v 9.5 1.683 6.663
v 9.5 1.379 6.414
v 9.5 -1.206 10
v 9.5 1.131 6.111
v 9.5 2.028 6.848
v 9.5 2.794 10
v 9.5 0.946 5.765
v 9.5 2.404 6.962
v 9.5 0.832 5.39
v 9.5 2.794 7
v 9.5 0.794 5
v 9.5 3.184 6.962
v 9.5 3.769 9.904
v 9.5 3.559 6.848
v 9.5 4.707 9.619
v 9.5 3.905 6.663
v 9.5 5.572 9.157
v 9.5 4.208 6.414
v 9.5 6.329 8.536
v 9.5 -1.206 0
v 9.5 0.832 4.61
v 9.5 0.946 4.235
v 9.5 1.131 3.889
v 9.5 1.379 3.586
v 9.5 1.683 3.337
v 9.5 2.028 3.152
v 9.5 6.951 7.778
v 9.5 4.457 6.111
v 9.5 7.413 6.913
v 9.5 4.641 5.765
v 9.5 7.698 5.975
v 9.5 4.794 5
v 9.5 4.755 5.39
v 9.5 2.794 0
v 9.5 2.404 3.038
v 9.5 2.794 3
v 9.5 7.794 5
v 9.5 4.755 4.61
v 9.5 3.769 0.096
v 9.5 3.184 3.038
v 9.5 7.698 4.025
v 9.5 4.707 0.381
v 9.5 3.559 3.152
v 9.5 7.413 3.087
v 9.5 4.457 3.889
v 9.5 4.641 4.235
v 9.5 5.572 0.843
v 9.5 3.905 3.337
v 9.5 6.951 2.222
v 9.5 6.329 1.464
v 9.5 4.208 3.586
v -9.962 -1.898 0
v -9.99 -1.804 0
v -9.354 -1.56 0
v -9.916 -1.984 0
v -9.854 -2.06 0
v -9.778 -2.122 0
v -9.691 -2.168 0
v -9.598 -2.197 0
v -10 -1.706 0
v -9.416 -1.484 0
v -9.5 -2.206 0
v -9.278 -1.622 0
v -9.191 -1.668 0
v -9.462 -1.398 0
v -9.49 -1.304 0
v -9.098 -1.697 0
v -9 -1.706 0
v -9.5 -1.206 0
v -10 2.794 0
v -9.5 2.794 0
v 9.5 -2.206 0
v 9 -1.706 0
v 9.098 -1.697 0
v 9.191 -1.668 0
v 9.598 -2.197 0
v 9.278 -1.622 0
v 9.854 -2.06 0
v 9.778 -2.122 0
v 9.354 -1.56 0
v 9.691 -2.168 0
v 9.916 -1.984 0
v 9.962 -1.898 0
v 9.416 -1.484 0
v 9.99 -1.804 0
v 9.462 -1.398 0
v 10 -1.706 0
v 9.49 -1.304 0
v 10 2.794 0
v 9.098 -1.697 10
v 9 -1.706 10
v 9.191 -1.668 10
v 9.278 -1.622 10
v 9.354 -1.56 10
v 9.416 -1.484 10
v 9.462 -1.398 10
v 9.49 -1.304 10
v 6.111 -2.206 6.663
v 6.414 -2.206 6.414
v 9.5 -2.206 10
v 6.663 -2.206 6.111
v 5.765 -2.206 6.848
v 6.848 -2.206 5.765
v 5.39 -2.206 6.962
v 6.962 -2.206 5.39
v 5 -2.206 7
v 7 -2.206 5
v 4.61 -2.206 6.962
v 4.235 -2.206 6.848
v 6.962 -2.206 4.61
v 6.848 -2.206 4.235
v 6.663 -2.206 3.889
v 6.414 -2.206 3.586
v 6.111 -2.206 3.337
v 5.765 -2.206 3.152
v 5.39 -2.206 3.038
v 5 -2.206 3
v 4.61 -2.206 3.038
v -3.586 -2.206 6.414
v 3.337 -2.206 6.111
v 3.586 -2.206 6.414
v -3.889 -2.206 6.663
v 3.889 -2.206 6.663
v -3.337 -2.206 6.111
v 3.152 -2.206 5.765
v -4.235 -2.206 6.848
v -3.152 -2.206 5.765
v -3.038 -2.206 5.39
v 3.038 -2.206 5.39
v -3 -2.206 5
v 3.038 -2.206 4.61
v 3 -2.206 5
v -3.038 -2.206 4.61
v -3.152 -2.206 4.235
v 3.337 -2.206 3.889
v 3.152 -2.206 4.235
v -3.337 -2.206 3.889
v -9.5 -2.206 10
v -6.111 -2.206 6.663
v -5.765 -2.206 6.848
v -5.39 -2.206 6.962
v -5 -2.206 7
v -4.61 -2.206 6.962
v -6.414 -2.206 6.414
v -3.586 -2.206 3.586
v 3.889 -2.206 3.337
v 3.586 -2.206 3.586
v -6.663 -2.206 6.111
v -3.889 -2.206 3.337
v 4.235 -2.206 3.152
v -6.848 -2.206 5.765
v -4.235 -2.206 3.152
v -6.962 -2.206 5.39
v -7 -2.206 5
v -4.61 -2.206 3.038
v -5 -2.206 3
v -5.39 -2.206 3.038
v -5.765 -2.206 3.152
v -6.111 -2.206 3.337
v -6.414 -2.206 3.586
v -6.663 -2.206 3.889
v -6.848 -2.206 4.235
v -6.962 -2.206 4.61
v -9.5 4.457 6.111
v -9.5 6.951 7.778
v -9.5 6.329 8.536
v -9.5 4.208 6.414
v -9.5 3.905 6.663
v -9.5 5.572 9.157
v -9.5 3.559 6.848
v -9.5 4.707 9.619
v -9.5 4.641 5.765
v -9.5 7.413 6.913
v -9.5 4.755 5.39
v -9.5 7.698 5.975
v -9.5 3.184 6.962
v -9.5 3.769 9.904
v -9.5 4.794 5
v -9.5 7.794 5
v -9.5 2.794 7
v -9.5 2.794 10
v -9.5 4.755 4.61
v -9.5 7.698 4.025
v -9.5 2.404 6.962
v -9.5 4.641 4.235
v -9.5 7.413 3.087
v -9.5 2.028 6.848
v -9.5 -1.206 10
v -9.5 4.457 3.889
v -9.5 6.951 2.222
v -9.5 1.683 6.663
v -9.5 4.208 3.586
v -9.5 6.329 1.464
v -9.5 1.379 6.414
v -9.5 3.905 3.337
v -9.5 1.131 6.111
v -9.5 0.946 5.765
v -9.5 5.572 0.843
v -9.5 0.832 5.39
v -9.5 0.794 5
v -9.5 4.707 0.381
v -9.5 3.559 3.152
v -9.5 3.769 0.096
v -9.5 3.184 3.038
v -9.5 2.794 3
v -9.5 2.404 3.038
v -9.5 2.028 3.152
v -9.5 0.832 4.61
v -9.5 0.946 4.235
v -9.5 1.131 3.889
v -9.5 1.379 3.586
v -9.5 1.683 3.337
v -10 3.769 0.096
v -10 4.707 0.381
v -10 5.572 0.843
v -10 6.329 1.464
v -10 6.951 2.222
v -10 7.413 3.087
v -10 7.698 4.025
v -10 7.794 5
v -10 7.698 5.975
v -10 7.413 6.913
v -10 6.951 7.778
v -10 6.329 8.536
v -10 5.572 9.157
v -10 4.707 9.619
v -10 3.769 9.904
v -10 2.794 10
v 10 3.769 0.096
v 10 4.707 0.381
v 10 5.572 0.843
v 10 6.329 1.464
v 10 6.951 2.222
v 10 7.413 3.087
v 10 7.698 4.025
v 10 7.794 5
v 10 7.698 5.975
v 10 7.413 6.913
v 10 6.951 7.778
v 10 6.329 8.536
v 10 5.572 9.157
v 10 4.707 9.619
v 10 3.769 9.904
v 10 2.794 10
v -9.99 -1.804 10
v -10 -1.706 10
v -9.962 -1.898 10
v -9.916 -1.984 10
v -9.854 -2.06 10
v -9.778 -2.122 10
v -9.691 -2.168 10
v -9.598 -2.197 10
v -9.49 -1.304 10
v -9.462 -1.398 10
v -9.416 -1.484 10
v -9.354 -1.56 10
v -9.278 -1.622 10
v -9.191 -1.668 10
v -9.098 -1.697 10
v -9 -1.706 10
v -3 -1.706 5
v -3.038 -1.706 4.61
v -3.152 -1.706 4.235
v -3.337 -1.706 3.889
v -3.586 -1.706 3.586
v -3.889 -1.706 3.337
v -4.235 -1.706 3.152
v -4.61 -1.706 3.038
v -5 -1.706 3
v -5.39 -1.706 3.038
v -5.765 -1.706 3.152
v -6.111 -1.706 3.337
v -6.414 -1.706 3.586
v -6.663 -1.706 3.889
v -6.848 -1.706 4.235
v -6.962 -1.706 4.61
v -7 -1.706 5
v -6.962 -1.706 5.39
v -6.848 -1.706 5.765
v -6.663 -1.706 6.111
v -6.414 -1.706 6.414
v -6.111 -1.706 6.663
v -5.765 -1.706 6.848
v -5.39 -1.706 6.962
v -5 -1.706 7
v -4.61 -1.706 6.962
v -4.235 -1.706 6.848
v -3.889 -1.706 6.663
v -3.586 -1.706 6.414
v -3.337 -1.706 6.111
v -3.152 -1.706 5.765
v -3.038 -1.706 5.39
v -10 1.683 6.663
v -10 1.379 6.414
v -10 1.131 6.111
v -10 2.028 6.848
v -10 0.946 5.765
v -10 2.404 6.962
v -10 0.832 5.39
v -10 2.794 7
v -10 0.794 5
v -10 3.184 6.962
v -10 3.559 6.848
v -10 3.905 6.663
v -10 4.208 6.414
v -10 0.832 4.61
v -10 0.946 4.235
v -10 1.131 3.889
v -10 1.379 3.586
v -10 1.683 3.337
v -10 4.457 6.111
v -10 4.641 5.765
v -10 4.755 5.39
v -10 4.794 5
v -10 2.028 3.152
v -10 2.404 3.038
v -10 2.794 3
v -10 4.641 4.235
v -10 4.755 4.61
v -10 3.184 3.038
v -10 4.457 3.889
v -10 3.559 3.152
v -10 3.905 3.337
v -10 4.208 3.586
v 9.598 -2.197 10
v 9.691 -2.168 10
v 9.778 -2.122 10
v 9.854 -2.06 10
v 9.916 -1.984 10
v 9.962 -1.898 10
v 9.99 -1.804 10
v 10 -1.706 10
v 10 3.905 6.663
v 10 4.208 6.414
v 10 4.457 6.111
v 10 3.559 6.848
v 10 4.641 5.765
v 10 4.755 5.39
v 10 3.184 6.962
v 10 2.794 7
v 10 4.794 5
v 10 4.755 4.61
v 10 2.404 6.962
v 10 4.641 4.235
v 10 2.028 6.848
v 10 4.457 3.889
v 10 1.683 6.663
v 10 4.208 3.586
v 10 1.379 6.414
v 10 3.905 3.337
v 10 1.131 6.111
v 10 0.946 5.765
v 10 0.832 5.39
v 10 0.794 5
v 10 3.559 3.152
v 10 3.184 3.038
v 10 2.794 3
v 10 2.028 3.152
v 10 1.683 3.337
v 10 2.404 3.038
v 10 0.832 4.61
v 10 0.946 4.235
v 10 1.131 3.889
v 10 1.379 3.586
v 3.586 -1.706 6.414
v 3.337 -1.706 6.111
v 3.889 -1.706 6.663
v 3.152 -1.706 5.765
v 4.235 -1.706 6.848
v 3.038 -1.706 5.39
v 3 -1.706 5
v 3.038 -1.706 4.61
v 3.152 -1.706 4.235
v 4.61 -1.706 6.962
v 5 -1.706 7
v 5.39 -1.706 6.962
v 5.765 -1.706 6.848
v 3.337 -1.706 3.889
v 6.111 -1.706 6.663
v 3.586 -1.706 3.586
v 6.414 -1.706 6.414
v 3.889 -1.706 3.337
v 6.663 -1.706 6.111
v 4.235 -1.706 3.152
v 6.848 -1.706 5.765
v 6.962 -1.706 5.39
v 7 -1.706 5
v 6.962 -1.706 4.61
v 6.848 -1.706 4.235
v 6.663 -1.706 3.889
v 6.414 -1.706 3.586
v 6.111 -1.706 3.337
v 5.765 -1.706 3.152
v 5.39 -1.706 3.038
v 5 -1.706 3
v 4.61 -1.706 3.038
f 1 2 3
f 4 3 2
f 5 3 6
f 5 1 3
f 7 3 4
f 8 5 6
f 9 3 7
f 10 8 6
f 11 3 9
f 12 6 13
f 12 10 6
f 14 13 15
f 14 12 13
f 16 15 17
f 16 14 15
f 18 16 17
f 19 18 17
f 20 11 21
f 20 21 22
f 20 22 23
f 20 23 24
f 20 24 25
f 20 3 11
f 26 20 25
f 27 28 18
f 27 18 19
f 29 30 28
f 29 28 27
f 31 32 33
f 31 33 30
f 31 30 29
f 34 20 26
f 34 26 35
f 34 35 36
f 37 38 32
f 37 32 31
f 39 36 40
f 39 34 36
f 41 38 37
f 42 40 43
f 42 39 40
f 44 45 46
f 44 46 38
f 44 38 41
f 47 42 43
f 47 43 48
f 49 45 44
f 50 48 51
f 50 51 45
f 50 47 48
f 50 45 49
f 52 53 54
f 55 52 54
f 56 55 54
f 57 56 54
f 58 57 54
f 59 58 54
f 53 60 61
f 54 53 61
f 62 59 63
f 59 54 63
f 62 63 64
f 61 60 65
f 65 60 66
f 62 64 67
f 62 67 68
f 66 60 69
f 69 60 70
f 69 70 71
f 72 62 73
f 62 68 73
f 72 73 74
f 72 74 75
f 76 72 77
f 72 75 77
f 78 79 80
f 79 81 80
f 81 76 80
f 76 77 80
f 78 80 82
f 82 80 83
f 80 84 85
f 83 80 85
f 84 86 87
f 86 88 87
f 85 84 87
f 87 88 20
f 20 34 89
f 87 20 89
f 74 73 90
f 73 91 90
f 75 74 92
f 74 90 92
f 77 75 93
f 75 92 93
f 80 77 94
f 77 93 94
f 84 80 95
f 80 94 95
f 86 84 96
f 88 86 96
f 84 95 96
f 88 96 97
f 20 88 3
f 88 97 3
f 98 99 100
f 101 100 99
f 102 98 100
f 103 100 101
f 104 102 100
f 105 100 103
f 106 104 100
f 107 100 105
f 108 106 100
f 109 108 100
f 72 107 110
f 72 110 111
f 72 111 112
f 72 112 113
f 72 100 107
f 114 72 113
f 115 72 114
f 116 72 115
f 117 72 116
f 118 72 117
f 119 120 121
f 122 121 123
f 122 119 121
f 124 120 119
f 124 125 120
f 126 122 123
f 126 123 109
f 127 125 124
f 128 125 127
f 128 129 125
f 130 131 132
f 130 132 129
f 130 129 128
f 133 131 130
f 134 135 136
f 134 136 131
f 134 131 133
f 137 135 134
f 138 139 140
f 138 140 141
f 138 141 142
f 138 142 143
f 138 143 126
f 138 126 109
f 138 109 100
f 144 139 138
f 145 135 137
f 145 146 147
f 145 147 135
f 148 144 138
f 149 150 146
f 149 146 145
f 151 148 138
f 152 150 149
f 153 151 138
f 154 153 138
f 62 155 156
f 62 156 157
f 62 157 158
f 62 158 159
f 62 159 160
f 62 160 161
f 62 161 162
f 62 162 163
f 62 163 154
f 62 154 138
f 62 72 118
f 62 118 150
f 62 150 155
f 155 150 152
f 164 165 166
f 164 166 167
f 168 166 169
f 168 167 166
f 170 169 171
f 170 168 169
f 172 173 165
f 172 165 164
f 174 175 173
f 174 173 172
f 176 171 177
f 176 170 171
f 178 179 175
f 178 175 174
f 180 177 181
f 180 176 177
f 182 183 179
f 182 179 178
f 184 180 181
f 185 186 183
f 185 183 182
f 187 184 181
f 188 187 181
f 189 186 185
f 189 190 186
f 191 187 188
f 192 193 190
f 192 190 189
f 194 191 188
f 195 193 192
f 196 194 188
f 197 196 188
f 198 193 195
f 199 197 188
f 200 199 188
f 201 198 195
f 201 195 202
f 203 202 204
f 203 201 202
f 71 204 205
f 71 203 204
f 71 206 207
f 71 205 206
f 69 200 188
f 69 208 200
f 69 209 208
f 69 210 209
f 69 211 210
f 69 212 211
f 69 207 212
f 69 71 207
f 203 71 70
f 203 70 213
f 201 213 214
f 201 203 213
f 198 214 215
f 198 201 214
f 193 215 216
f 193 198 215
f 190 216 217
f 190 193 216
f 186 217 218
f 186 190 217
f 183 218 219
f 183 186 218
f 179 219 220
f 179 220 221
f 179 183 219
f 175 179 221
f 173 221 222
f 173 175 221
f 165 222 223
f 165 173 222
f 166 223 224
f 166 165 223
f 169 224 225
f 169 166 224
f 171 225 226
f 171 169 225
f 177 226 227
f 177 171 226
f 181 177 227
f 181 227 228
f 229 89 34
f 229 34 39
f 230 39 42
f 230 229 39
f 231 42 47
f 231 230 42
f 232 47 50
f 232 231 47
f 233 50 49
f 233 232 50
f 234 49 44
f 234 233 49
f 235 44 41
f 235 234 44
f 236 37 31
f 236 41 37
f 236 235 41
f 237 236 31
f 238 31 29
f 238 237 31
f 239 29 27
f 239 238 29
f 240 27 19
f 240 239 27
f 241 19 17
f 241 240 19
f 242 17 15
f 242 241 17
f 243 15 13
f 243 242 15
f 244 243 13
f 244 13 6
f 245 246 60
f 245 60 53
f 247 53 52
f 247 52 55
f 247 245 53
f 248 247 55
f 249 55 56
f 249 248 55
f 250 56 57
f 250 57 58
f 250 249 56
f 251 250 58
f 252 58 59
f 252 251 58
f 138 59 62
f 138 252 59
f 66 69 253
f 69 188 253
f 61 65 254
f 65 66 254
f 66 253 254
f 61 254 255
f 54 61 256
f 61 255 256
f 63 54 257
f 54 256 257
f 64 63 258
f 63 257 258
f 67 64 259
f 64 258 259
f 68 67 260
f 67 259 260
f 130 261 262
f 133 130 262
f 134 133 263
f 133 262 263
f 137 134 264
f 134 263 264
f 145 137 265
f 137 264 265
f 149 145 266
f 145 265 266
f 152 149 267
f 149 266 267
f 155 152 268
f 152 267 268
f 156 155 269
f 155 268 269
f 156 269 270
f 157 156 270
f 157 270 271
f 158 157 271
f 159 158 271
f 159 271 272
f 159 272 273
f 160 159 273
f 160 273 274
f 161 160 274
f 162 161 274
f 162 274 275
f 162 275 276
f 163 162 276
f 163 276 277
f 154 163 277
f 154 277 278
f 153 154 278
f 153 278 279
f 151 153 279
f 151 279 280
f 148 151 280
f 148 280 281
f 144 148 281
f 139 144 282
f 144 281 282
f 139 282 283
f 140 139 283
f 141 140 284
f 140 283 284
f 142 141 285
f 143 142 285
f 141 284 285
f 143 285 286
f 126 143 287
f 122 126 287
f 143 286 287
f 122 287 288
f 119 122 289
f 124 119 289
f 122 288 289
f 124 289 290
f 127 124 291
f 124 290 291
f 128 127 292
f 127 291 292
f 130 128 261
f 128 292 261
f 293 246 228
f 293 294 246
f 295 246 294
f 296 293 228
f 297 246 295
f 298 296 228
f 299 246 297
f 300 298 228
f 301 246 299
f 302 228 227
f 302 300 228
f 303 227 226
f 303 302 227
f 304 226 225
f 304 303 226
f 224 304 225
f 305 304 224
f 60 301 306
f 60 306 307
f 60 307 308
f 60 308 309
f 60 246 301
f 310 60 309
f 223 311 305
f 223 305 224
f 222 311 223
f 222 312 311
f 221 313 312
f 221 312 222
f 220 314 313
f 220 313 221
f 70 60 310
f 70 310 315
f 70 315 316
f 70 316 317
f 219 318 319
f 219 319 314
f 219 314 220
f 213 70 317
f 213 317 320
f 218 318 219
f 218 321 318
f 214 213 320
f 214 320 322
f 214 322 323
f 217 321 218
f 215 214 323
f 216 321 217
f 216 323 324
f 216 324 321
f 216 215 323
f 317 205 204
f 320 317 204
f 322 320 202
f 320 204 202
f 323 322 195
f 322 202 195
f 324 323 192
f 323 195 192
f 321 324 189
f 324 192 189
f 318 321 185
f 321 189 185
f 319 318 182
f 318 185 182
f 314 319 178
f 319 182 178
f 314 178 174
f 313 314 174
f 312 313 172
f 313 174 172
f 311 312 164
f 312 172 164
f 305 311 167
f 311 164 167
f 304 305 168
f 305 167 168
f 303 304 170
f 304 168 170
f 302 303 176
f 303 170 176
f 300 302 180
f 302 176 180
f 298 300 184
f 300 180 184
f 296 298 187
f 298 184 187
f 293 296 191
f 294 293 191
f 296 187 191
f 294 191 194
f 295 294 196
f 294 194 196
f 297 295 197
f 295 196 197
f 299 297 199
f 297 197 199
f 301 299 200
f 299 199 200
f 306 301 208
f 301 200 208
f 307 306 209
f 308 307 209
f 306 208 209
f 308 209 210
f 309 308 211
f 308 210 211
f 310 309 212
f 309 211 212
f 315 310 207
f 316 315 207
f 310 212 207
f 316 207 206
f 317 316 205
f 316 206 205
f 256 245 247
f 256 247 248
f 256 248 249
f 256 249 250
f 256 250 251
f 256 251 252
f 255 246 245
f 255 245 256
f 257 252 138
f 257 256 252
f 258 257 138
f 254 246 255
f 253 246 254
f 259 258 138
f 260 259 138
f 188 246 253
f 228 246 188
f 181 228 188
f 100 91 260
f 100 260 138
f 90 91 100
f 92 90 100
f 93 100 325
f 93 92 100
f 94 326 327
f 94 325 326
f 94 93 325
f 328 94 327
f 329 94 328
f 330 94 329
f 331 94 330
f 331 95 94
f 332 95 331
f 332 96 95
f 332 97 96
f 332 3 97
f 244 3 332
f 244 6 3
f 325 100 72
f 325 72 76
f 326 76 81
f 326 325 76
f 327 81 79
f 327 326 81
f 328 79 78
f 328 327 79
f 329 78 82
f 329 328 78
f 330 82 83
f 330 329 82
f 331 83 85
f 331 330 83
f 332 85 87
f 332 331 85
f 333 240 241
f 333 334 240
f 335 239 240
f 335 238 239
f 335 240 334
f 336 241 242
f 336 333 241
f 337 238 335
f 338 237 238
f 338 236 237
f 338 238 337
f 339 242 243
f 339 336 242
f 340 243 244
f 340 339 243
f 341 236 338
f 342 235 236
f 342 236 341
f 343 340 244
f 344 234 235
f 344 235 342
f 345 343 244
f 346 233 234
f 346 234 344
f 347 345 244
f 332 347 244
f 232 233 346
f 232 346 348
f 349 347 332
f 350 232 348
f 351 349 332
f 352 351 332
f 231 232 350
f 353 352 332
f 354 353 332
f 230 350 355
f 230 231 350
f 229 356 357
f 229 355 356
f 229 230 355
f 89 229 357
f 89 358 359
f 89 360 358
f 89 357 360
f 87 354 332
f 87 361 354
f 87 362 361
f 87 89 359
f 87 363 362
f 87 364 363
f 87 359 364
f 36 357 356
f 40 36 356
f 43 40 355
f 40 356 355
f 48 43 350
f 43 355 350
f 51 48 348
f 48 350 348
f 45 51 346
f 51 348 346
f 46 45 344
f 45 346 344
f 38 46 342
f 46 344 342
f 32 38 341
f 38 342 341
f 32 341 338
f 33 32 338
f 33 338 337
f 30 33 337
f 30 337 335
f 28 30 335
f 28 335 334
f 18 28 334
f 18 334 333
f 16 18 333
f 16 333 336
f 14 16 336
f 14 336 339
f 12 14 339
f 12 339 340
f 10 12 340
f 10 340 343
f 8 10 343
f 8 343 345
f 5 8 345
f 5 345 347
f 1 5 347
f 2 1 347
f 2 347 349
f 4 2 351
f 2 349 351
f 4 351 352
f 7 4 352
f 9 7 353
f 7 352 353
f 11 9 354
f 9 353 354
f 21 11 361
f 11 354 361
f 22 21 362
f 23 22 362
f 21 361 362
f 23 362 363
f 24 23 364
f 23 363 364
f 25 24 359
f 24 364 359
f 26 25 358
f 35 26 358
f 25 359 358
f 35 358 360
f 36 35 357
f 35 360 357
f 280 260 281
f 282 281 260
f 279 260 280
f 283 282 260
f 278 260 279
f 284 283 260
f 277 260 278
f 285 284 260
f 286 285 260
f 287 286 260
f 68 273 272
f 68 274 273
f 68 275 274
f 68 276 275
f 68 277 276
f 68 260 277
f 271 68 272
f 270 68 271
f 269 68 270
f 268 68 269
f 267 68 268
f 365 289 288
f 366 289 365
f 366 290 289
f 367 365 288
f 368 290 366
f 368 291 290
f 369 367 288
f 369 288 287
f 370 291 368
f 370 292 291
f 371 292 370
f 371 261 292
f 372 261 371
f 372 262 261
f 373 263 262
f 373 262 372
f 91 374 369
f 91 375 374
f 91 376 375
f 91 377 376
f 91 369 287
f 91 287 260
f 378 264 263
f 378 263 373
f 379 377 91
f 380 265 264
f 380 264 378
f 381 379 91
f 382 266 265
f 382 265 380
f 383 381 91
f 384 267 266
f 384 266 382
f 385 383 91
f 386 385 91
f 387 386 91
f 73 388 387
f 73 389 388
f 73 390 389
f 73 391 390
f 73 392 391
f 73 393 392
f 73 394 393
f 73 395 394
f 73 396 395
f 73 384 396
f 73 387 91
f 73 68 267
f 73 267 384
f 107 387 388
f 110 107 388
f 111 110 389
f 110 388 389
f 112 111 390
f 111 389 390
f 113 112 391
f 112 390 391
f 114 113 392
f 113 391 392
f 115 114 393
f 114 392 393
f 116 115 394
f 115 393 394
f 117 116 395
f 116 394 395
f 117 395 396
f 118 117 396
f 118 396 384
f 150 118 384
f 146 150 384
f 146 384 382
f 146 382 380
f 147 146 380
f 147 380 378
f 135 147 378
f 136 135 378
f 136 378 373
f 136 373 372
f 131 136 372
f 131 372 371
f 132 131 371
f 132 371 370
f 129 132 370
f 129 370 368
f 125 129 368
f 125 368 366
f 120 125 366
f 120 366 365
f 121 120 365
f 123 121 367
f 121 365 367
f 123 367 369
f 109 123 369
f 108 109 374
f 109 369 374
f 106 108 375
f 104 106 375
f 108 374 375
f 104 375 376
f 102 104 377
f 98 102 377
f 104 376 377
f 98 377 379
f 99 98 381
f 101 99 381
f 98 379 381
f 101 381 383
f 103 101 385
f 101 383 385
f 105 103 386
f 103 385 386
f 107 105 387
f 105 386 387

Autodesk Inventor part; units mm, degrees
ref_plane "YZ Plane" through (0, 0, 0) normal (1, 0, 0) x (0, 1, 0)
ref_plane "XZ Plane" through (0, 0, 0) normal (0, 1, 0) x (-1, 0, 0)
ref_plane "XY Plane" through (0, 0, 0) normal (0, 0, 1) x (1, 0, 0)
sketch "Náčrt1" plane through (0, 0, 0) normal (0, 0, 1) x (1, 0, 0)
  line L0 (-9.5, 7.7937) -> (-9.5, -1.7063)
  line L1 (-9.5, -1.7063) -> (9.5, -1.7063)
  line L2 (9.5, -1.7063) -> (9.5, 7.7937)
  line L3 (9.5, 7.7937) -> (10, 7.7937)
  line L4 (10, 7.7937) -> (10, -2.2063)
  line L5 (10, -2.2063) -> (-10, -2.2063)
  line L6 (-10, -2.2063) -> (-10, 7.7937)
  line L7 (-10, 7.7937) -> (-9.5, 7.7937)
  point P0 (0, 0)
  point P1 (9.5, 3.0437)
  point P2 (-9.75, 7.7937)
  point P3 (9.75, 7.7937)
  dimension "d0" = 10
  dimension "d1" = 10
  dimension "d2" = 0.5
  dimension "d3" = 0.5
  dimension "d4" = 0.5
  dimension "d5" = 10
  dimension "d6" = 10
extrude "Vysunutí1" add sketch "Náčrt1" along normal blind 10
sketch "Náčrt2" plane through (10, -2.2063, 0) normal (1, 0, 0) x (0, 0, -1)
  circle A0 centre (-5, 5) radius 2
  line L0 (0, 0) -> (0, 10) projected
  point P0 (0, 2.2063)
  point P1 (0, 5)
  dimension "d9" = 4
  dimension "d10" = 5
extrude "Vysunutí2" cut sketch "Náčrt2" against normal through all
pattern_linear "Obdélníkové pole1" count 10 spacing 10 along (0, 0, 1) of "Vysunutí2"
sketch "Náčrt3" plane through (-9.5, -1.7063, 0) normal (0, 1, 0) x (1, 0, 0)
  circle A0 centre (4.5, -5) radius 2
  line L0 (19, -10) -> (0, -10) projected
  line L1 (-0.5, 0) -> (-0.5, -10) projected
  point P0 (9.5, 0)
  dimension "d16" = 4
  dimension "d17" = 5
  dimension "d18" = 5
extrude "Vysunutí3" cut sketch "Náčrt3" against normal through all
pattern_linear "Obdélníkové pole2" count 10 spacing 10 along (0, 0, -1) count 5 spacing 10 along (1, 0, 0) of "Vysunutí3"
sketch "Náčrt4" plane through (10, -2.2063, 0) normal (1, 0, 0) x (0, 0, -1)
  arc A0 (0, 5) -> (-10, 5) centre (-5, 5) ccw
  line L0 (0, 0) -> (0, 10) projected
  line L1 (0, 0) -> (-10, 0) projected
  line L2 (0, 10) -> (-10, 10) projected
  line L3 (-10, 10) -> (0, 10)
  line L4 (0, 10) -> (0, 5)
  line L5 (0, 10) -> (0, 0.5) projected
  line L6 (-10, 10) -> (-10, 0.5) projected
  line L7 (-10, 5) -> (-10, 10)
  point P0 (0, 2.2063)
  point P1 (-5, 10)
  dimension "d27" = 10
  dimension "d28" = 5
  dimension "d29" = 5
extrude "Vysunutí4" cut sketch "Náčrt4" against normal through all
fillet "Zaoblení1" radius 0.5 2 edges at (10, -2.2063, 5) (9.5, -1.7063, 5)
fillet "Zaoblení2" radius 0.5 2 edges at (-10, -2.2063, 5) (-9.5, -1.7063, 5)
properties part number "4031"
